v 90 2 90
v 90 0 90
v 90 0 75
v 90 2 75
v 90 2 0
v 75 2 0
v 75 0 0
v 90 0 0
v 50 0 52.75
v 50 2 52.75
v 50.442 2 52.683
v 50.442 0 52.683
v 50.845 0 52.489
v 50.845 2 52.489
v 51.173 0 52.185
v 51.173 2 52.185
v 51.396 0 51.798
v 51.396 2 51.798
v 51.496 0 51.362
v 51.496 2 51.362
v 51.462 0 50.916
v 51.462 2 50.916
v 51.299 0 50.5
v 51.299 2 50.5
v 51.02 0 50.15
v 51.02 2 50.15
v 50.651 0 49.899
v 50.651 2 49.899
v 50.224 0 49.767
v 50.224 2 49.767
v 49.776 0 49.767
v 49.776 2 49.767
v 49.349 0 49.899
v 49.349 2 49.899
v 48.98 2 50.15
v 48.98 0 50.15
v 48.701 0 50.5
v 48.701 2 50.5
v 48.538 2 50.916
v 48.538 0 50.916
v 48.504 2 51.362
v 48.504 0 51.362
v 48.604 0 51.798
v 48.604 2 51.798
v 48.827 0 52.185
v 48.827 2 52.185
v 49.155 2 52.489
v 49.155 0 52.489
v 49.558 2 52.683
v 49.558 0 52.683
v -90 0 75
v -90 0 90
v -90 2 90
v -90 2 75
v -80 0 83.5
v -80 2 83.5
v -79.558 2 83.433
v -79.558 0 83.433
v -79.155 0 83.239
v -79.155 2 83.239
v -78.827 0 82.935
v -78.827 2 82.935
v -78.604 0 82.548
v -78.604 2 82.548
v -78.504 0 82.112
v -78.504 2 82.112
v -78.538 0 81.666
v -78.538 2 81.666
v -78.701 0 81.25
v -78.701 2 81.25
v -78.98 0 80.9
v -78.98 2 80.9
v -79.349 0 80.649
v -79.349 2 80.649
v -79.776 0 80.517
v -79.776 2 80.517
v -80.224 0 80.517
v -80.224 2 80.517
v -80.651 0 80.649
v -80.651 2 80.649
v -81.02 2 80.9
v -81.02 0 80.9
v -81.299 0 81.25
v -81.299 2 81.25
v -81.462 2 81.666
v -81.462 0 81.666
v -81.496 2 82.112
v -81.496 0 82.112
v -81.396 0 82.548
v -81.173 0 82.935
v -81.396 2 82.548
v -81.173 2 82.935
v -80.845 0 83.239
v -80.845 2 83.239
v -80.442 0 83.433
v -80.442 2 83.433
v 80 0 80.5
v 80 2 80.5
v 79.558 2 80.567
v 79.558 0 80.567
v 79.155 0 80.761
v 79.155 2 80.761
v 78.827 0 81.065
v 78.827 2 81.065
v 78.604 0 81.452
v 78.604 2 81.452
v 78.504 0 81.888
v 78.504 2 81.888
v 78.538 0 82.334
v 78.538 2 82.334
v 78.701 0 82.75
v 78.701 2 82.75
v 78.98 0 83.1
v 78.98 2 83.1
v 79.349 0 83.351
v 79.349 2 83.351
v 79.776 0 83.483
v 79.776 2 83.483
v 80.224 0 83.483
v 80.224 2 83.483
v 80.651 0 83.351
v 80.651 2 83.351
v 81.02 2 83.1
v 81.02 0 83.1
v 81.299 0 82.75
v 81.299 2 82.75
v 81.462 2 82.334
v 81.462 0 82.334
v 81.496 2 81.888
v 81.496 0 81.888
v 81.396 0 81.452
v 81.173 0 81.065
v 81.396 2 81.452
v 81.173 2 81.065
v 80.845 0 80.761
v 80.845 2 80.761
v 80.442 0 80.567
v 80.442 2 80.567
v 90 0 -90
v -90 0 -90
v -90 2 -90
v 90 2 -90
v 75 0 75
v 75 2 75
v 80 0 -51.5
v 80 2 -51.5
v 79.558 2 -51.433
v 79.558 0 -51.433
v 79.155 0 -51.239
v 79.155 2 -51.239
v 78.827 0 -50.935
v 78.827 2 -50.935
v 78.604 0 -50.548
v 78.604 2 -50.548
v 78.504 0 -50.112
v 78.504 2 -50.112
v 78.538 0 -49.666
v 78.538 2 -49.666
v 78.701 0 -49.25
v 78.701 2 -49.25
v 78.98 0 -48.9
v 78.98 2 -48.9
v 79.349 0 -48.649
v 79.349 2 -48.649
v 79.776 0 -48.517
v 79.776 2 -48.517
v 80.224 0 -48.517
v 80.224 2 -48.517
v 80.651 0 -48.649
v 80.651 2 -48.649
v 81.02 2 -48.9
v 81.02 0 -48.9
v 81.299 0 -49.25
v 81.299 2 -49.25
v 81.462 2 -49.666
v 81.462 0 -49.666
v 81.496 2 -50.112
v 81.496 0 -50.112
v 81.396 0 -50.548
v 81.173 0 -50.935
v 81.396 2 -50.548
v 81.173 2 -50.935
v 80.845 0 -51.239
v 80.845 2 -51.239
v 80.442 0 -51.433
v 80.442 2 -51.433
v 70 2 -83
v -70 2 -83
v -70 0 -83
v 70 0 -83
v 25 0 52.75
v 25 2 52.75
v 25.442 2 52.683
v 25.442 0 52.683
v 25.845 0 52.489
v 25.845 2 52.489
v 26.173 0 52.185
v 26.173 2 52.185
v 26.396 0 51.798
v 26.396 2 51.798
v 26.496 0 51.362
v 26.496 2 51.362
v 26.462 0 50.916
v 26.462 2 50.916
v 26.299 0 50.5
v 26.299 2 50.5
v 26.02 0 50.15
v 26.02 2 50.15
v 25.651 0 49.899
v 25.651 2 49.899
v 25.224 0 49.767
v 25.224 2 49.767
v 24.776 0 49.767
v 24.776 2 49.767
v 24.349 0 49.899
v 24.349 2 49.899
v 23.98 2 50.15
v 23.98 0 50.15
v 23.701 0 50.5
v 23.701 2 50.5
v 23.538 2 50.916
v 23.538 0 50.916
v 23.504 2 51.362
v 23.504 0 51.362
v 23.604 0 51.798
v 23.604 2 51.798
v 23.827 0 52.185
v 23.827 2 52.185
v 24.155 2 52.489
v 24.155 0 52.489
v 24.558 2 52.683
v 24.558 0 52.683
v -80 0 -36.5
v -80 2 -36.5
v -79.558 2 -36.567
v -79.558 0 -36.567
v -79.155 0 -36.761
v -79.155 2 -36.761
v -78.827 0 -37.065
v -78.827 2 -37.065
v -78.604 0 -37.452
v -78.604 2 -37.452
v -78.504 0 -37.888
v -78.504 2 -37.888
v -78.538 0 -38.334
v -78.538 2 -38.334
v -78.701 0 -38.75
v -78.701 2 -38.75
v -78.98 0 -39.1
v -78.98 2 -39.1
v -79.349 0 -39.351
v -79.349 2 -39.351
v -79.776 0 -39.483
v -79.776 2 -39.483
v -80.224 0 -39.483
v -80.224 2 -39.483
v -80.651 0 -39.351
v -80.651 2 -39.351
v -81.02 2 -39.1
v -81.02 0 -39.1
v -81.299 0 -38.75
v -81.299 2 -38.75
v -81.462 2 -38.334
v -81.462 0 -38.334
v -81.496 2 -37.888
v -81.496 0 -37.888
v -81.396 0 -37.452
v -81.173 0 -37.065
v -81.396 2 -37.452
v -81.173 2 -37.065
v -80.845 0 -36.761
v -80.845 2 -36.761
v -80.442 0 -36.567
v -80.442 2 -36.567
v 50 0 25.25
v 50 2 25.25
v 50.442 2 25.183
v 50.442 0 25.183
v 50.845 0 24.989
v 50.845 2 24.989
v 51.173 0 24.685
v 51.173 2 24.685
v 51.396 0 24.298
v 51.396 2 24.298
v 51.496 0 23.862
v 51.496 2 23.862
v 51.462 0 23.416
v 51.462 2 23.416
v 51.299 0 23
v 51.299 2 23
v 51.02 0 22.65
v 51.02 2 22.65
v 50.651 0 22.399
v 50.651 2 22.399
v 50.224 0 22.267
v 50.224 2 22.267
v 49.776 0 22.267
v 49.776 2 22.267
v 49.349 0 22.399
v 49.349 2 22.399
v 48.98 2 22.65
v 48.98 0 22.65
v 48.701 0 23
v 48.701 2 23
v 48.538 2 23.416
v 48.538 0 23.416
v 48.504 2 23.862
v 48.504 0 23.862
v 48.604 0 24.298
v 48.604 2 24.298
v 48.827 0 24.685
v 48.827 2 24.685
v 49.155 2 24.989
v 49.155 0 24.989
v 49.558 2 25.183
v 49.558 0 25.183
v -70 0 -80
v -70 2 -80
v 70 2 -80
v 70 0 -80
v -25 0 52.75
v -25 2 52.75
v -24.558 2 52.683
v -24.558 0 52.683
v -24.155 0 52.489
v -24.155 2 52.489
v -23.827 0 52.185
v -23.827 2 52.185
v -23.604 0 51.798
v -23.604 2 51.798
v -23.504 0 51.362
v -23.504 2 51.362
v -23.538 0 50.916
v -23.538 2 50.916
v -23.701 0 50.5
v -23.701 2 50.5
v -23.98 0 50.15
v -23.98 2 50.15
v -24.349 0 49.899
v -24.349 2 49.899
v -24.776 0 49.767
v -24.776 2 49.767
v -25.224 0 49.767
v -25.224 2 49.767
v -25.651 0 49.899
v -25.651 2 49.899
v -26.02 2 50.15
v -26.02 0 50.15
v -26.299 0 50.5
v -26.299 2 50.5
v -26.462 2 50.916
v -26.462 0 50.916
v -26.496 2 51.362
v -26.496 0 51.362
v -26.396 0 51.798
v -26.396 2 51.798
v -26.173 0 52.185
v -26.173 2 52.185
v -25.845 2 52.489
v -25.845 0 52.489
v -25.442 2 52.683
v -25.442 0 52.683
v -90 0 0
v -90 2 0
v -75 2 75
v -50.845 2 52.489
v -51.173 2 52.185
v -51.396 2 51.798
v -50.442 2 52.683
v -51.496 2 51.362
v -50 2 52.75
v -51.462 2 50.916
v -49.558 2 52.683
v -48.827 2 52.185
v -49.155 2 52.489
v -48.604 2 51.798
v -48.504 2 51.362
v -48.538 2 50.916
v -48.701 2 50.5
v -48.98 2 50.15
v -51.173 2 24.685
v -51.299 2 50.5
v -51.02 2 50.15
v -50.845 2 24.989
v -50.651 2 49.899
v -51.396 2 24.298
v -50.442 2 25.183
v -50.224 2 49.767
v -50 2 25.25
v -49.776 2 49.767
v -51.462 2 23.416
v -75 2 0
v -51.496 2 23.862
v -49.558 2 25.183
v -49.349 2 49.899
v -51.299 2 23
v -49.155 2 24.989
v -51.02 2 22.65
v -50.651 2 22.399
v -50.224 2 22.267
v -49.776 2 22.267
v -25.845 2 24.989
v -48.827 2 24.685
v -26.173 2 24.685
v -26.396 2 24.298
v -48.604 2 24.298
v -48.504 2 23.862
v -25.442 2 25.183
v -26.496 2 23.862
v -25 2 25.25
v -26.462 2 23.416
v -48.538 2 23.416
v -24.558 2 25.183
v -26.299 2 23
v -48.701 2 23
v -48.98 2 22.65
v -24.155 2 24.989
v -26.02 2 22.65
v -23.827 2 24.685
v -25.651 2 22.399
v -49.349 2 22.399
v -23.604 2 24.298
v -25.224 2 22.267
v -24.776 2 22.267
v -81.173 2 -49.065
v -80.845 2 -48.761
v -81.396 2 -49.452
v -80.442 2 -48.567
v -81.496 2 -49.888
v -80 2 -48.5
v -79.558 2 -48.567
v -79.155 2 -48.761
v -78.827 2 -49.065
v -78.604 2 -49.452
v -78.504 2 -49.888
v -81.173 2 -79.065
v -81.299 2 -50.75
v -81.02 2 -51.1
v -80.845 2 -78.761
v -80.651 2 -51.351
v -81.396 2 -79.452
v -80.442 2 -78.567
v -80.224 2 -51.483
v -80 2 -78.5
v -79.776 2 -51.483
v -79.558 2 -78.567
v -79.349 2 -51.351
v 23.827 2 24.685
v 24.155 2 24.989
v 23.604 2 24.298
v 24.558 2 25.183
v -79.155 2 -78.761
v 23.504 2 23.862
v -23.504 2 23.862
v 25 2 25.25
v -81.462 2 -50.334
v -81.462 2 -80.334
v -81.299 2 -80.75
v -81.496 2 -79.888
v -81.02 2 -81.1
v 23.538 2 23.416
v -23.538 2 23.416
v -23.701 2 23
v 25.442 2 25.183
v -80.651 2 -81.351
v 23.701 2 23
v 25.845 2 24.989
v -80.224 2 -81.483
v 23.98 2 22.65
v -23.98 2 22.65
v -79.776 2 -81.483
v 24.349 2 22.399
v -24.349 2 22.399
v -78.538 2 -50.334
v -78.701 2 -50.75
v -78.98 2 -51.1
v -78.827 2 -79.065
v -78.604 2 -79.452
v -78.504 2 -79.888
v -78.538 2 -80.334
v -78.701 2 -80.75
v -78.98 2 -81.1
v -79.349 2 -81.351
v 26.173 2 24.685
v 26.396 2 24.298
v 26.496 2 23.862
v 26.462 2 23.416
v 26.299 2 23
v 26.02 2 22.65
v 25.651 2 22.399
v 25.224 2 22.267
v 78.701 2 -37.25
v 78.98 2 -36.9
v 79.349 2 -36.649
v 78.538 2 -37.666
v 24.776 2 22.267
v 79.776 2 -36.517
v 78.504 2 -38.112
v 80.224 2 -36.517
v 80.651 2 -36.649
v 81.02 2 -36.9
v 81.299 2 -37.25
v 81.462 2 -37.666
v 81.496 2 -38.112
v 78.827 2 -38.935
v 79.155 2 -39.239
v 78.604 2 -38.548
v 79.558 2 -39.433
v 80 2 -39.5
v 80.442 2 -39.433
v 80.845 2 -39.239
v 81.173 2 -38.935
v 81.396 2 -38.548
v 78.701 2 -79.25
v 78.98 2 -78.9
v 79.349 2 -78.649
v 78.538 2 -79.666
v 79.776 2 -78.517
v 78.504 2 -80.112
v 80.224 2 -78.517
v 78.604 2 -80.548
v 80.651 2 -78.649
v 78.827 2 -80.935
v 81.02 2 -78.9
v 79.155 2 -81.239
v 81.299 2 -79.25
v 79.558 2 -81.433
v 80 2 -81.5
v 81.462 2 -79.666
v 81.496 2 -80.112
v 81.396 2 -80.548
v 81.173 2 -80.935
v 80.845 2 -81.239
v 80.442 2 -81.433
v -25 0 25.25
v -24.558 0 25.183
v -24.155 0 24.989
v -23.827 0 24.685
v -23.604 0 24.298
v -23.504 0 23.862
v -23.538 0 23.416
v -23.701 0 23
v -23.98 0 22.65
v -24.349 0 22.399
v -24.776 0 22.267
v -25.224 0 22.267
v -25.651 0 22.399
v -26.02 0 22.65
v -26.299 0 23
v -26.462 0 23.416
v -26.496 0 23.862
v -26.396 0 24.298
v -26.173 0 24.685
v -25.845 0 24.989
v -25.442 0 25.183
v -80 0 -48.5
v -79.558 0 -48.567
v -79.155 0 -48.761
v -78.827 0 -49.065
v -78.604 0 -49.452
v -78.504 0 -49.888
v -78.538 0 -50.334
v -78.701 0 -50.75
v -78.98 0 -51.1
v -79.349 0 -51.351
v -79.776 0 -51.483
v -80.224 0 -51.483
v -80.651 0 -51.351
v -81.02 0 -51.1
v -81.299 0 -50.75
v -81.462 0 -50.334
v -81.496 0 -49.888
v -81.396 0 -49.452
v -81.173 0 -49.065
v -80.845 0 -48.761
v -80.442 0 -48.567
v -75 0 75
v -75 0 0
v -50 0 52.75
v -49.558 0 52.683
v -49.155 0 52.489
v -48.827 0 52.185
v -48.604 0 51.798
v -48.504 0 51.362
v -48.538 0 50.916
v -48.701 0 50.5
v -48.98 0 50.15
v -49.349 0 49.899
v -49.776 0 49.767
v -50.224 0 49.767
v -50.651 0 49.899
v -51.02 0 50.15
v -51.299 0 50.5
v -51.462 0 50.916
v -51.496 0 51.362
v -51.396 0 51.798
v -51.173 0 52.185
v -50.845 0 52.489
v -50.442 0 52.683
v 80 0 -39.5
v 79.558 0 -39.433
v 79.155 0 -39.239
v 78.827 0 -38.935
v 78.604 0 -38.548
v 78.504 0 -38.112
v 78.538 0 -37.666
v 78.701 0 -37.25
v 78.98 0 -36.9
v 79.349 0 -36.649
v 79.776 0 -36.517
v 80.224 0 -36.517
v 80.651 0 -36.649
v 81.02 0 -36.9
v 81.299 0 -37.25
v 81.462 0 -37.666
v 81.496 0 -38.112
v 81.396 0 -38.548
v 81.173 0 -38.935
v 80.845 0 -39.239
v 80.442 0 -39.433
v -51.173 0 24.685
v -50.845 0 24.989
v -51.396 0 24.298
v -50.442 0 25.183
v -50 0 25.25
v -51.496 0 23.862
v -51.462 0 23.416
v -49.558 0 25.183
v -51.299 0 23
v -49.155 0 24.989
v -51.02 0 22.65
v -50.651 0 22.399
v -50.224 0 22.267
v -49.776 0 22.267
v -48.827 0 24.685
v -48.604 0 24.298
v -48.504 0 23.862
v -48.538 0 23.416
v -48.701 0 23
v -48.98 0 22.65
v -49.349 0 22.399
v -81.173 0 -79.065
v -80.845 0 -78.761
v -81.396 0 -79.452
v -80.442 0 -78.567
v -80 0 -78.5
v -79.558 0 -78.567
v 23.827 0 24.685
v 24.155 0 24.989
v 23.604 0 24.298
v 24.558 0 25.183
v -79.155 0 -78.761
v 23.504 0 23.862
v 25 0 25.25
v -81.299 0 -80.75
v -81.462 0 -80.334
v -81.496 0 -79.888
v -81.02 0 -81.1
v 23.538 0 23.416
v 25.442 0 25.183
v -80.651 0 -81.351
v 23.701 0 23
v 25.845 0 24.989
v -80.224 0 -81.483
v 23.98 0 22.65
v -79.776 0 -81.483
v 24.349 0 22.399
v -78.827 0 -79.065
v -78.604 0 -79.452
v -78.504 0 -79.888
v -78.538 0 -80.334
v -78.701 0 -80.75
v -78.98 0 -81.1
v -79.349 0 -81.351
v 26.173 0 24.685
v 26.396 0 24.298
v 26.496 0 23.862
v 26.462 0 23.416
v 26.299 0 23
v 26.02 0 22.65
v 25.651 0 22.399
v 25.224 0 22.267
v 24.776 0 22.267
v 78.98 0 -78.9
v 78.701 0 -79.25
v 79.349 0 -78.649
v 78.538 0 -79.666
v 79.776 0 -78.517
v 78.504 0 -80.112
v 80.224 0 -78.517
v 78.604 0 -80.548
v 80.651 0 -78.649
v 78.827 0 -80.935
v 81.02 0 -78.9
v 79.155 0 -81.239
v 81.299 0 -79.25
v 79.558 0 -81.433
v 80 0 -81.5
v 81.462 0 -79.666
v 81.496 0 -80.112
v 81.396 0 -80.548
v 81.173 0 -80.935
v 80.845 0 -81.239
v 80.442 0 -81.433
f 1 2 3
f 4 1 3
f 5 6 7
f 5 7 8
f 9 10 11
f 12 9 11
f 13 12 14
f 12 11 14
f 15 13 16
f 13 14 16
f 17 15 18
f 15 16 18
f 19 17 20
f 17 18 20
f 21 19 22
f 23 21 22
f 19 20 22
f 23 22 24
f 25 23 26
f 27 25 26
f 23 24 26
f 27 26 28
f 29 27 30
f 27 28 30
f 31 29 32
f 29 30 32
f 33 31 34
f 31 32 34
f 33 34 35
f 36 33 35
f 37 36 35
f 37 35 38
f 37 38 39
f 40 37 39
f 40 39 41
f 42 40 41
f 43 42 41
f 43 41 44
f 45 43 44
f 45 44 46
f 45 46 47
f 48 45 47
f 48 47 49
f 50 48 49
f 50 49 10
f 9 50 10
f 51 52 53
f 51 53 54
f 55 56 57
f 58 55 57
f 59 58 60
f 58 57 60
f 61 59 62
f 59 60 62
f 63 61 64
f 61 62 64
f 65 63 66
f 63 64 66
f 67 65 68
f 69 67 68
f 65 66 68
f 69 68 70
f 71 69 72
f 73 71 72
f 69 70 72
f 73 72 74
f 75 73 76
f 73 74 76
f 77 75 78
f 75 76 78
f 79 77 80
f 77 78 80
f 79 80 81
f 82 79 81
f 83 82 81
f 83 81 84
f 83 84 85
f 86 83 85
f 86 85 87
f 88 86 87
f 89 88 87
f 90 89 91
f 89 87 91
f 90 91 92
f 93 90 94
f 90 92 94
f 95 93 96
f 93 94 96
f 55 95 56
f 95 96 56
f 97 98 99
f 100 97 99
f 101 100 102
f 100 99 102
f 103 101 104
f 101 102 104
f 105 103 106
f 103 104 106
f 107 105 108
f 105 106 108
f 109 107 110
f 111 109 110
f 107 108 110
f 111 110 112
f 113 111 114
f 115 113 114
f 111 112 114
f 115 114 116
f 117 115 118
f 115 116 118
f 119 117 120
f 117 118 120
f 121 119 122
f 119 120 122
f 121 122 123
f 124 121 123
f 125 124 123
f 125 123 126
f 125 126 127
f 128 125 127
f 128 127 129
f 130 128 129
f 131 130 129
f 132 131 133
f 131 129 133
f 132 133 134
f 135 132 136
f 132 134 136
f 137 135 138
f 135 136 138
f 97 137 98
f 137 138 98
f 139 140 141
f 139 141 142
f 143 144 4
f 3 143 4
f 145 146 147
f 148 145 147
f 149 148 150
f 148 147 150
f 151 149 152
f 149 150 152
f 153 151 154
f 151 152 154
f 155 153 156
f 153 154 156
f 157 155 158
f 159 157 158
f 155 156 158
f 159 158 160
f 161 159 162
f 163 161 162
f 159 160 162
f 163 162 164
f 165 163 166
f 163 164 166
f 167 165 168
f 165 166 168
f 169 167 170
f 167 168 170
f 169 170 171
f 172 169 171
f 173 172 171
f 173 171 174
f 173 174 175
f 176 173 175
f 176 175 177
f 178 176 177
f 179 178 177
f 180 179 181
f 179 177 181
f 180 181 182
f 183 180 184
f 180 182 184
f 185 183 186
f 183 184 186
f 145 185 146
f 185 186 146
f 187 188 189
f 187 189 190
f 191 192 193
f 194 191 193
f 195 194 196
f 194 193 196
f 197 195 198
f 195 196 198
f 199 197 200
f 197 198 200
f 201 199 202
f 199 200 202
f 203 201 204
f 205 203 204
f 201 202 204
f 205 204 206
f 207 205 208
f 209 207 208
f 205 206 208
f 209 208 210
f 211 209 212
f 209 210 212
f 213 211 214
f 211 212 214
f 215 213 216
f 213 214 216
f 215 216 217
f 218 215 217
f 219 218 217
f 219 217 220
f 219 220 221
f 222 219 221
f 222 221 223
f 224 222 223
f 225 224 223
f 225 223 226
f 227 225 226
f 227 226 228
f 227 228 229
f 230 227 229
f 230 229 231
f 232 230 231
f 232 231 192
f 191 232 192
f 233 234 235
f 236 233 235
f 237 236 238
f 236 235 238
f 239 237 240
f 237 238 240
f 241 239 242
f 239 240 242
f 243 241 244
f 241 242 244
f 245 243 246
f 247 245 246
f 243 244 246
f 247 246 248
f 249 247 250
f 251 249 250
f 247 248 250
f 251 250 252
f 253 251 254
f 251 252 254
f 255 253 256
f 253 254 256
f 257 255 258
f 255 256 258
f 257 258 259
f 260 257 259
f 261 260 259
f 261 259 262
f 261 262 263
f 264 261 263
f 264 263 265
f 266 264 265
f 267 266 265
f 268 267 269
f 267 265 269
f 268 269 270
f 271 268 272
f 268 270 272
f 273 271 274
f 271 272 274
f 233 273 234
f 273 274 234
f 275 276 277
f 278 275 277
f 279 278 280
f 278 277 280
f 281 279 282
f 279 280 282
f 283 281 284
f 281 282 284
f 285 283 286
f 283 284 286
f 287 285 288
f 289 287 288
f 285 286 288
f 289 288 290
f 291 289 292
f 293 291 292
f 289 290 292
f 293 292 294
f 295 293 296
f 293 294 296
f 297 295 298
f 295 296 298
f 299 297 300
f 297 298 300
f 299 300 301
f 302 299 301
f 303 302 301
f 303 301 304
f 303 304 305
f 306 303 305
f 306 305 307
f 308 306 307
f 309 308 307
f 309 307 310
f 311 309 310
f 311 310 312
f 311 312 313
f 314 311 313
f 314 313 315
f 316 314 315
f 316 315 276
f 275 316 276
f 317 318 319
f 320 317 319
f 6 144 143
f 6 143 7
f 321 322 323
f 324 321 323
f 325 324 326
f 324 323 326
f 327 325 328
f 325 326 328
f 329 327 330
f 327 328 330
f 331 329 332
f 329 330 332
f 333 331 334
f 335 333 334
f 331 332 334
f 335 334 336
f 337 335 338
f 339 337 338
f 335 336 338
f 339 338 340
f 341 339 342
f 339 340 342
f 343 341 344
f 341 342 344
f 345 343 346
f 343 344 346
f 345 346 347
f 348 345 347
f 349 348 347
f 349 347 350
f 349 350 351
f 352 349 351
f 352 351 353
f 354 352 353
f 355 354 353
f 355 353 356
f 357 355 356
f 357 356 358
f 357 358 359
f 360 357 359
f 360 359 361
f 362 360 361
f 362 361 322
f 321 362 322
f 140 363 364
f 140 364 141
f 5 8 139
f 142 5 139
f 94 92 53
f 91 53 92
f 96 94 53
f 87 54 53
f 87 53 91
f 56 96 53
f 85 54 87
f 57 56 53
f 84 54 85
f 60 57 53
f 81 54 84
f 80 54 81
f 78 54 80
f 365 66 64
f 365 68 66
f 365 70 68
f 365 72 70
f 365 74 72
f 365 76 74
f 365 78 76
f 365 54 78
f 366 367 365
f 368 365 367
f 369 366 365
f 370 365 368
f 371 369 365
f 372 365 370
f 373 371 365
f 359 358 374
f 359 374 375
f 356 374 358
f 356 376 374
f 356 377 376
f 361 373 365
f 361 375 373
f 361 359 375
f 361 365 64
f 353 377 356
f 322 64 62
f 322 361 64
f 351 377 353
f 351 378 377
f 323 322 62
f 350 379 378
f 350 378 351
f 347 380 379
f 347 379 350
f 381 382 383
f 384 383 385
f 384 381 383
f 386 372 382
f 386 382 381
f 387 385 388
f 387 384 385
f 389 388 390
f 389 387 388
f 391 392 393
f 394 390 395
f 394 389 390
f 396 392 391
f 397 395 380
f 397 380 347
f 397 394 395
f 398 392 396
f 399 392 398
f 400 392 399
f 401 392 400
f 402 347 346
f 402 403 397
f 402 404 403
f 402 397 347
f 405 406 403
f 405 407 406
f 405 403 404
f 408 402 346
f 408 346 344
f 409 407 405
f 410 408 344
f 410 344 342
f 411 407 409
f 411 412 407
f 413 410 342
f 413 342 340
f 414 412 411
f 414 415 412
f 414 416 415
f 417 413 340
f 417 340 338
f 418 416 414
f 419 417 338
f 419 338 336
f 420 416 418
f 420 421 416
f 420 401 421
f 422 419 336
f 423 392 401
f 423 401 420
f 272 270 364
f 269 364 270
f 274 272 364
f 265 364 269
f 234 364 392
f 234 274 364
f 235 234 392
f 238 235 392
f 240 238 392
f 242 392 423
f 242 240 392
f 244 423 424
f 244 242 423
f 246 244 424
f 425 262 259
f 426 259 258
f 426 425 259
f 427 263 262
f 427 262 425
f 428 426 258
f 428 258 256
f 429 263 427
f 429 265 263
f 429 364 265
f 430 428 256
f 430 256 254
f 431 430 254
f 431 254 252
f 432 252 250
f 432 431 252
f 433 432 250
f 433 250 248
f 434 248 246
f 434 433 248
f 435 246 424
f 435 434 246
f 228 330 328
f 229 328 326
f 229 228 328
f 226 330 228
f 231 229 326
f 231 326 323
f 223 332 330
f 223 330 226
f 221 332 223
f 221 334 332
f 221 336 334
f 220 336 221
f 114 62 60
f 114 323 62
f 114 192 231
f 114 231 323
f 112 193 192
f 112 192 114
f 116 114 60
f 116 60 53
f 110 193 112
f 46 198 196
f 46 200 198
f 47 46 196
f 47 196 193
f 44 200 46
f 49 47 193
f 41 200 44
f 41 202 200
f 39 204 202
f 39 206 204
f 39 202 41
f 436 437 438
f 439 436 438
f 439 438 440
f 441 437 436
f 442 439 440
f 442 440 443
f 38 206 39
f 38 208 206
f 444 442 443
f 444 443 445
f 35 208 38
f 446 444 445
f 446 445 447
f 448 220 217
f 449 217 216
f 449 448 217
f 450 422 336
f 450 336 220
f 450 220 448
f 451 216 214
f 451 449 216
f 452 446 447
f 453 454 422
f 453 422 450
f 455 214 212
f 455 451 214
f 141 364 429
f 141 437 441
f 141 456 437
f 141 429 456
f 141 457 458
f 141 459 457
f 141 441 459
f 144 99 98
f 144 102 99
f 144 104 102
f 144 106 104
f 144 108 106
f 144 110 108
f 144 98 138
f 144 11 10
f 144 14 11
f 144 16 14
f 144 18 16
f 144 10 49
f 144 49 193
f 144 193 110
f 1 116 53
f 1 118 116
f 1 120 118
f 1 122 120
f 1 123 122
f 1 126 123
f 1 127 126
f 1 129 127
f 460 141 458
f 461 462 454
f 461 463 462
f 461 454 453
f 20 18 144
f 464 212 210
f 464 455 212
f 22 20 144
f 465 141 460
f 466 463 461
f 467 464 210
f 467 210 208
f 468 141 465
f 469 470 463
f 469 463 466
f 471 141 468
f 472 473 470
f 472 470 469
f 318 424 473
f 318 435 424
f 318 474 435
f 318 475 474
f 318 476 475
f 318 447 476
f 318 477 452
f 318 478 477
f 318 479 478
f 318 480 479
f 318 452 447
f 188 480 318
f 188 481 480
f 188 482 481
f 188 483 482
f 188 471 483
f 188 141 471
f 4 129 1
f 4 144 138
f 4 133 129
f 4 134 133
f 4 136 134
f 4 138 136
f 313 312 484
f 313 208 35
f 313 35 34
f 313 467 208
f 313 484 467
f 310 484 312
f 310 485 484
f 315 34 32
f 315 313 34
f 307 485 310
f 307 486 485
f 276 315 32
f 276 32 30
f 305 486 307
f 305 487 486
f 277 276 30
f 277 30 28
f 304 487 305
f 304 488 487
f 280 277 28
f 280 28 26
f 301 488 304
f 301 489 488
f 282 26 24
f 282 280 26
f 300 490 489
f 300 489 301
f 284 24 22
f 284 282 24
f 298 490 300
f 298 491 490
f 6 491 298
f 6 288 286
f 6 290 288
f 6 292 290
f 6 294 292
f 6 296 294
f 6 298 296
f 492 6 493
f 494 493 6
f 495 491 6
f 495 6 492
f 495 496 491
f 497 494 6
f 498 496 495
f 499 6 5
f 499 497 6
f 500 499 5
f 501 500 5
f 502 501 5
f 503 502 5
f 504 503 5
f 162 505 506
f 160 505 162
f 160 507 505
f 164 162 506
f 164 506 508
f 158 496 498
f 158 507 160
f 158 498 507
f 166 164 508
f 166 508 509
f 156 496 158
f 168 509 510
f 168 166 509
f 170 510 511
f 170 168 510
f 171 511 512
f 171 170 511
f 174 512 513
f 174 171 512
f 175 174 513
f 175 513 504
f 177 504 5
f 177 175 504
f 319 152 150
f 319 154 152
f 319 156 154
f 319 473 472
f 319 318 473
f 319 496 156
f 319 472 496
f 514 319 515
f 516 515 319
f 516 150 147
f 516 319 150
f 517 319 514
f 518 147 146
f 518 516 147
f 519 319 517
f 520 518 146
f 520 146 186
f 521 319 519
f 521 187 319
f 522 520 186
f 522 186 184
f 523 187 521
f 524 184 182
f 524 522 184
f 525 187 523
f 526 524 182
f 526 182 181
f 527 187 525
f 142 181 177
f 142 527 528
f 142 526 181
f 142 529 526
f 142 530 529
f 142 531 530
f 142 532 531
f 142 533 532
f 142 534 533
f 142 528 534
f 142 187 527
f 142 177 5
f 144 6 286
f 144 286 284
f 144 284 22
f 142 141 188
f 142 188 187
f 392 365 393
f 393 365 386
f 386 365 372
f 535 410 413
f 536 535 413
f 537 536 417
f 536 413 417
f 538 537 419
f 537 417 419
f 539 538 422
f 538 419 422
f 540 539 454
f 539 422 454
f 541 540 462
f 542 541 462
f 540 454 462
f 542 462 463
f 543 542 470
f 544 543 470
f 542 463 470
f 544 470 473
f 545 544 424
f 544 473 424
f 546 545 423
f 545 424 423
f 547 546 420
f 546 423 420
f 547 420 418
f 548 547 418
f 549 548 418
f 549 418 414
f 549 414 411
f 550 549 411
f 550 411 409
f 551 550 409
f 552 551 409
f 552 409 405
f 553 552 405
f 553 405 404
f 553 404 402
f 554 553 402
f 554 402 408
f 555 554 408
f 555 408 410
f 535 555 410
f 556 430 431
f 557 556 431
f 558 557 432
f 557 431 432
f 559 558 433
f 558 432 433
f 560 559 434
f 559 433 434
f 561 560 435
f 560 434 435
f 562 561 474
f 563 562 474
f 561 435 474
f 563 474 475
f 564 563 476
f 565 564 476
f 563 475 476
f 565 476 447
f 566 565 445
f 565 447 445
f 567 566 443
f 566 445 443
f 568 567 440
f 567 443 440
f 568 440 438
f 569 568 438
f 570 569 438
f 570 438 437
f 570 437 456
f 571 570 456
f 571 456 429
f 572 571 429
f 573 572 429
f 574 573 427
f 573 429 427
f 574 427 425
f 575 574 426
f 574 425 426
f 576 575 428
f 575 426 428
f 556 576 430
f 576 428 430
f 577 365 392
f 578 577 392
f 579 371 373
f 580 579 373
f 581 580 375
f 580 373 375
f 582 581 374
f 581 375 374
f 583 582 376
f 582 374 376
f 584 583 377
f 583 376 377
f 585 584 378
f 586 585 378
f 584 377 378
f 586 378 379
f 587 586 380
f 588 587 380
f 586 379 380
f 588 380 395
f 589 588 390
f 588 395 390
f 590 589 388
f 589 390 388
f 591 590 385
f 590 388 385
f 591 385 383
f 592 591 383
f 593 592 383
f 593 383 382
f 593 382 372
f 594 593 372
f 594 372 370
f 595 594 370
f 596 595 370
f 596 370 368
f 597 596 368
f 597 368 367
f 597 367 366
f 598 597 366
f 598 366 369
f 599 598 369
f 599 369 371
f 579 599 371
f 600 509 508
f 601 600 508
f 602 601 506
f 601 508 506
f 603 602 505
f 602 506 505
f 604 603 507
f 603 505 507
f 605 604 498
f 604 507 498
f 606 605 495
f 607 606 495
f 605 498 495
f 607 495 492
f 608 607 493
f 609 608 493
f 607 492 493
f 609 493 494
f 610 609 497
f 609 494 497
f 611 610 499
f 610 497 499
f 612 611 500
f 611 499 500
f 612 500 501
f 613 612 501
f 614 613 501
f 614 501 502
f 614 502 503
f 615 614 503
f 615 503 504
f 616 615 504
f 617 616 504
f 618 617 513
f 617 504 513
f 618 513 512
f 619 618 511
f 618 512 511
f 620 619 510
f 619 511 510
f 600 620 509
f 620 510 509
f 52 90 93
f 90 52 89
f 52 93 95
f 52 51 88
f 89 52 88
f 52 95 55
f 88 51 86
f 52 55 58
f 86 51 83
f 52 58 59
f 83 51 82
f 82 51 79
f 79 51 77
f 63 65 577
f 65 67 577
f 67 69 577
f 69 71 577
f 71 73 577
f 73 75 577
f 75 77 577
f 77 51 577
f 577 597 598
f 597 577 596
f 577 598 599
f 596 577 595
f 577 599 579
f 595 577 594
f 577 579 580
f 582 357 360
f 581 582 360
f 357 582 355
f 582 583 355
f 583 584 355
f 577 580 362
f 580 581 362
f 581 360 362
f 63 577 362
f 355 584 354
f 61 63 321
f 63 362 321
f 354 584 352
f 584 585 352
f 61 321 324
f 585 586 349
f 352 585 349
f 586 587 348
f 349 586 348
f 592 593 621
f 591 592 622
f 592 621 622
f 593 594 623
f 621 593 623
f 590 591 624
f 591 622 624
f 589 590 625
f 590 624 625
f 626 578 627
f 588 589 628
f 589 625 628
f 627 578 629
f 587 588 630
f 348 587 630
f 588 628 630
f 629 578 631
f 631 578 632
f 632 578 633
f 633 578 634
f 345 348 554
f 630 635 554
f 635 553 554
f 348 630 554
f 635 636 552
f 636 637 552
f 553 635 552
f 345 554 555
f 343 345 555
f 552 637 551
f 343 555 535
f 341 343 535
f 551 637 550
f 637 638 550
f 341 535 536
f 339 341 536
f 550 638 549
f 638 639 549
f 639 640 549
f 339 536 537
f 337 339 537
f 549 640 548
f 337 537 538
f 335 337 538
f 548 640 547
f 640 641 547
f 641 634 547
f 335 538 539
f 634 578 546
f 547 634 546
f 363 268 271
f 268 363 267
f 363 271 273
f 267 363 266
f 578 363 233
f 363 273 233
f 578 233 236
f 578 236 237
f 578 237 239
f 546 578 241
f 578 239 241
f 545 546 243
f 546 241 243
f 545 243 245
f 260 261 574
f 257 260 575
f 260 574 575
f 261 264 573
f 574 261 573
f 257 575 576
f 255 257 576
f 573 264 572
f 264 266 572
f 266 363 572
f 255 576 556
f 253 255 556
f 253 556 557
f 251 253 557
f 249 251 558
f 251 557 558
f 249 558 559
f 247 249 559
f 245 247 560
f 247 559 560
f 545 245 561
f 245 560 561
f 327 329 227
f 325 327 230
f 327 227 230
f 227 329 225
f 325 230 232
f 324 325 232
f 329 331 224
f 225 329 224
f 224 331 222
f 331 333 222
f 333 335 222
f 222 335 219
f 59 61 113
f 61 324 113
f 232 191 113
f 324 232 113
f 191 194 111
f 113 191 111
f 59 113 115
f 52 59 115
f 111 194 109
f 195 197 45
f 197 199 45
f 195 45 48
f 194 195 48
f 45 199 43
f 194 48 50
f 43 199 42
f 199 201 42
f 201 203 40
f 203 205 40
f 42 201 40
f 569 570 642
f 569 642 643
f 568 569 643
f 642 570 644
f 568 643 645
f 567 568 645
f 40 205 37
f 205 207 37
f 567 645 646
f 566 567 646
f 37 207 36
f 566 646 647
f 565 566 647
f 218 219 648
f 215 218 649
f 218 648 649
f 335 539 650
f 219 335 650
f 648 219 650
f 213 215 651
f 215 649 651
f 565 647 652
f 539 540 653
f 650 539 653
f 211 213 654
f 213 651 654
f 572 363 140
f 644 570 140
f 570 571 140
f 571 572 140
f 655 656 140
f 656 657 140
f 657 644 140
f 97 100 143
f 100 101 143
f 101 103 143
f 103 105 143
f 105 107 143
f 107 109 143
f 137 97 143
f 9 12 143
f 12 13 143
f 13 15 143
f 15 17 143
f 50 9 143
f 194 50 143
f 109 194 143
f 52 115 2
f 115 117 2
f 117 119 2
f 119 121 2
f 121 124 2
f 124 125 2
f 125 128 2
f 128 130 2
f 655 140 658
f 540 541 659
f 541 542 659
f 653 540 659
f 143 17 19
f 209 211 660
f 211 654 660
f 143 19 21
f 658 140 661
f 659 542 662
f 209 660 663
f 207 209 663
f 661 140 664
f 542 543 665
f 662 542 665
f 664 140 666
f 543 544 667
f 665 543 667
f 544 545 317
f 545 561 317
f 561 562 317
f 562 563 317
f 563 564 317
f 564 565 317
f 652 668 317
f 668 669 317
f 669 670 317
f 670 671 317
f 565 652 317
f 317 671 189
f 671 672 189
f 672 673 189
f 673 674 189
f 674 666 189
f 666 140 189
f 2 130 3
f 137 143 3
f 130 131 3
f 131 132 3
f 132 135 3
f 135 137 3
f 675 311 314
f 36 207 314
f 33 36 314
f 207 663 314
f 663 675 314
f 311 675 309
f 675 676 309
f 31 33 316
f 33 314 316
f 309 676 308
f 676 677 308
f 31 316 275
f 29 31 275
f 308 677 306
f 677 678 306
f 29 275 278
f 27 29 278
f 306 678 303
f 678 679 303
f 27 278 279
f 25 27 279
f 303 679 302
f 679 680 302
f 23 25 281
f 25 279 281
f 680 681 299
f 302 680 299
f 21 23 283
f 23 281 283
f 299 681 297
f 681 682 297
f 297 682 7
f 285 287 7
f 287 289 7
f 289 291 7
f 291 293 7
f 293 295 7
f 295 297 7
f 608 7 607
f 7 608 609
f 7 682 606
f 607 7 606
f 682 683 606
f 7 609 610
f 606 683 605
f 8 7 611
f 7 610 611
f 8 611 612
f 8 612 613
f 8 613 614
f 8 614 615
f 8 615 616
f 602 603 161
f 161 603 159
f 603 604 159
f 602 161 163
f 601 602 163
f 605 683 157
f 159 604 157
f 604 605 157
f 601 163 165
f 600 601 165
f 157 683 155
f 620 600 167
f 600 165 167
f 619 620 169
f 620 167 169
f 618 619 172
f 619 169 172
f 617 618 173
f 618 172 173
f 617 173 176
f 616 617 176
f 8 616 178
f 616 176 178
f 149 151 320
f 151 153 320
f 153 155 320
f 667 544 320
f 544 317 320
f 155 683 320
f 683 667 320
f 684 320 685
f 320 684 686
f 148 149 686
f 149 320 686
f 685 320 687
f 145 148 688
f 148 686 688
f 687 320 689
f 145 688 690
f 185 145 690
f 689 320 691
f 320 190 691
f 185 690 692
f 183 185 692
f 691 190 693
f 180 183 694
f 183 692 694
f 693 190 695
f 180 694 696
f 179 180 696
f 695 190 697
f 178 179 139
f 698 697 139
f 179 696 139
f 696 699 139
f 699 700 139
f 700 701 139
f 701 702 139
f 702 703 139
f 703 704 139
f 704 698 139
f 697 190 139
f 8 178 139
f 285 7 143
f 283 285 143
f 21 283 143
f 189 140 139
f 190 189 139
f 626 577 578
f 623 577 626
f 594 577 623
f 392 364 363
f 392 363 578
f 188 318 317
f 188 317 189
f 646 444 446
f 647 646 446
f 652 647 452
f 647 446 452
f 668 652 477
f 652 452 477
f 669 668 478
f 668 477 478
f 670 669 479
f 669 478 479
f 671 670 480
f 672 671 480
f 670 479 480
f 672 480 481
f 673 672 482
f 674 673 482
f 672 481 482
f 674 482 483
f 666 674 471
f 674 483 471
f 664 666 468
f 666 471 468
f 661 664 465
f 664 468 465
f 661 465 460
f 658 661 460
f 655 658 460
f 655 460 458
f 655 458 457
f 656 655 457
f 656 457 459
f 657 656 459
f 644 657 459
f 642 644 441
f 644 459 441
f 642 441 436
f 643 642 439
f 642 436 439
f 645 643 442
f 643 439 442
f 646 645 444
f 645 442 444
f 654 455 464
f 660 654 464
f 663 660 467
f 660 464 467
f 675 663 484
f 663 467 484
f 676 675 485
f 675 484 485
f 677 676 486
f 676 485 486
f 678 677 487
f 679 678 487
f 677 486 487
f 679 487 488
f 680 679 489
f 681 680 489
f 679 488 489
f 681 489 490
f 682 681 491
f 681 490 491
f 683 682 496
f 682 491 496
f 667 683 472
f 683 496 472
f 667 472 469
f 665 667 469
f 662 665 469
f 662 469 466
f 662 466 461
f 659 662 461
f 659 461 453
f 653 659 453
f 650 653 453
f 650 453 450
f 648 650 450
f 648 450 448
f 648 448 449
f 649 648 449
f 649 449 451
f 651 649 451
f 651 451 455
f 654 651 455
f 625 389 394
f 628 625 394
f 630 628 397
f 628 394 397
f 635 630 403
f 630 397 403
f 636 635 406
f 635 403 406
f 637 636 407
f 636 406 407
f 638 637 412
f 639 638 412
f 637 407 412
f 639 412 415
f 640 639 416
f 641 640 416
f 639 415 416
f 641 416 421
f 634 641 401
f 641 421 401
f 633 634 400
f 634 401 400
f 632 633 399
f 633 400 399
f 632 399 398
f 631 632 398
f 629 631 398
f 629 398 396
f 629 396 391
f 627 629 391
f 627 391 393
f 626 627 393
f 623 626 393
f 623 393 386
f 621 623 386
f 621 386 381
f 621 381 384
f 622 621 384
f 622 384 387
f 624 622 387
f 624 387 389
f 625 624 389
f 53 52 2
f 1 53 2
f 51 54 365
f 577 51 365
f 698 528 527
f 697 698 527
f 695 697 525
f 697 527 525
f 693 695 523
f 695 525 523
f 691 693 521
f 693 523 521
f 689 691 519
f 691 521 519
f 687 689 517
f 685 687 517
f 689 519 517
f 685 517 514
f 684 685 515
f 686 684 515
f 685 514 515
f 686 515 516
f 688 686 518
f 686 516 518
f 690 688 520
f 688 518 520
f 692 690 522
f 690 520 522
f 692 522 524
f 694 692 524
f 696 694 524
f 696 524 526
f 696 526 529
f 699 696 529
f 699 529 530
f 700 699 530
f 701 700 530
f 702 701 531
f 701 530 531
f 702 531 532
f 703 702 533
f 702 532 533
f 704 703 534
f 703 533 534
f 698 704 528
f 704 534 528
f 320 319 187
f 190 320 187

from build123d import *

# Parameters (mm, degrees)
SKETCH1_W           = 180
SKETCH1_H           = 180
BOSS_EXTRUDE1_DEPTH = 2
SKETCH2_R           = 1.5
SKETCH2_W           = 15
SKETCH2_H           = 75
SKETCH2_W_2         = 140
SKETCH2_H_2         = 3
CUT_EXTRUDE1_DEPTH  = 2
SKETCH3_R           = 1.5
CUT_EXTRUDE2_DEPTH  = 3


with BuildPart() as part:
    # Sketch1 → Boss-Extrude1 (new body)
    with BuildSketch(Plane(origin=(0, 0, 0), x_dir=(1, 0, 0), z_dir=(0, 1, 0))):
        Rectangle(SKETCH1_W, SKETCH1_H)
    extrude(amount=BOSS_EXTRUDE1_DEPTH)

    # Sketch2 → Cut-Extrude1 (cut)
    with BuildSketch(Plane(origin=(0, 2, 0), x_dir=(1, 0, 0), z_dir=(0, 1, 0))):
        with Locations(Location((-80, 38, 0), (0, 0, 270))):
            Circle(SKETCH2_R)
        with Locations(Location((-80, -82, 0), (0, 0, 270))):
            Circle(SKETCH2_R)
        with Locations(Location((80, -82, 0), (0, 0, 90))):
            Circle(SKETCH2_R)
        with Locations(Location((80, 38, 0), (0, 0, 90))):
            Circle(SKETCH2_R)
        with Locations(Location((-80, 80, 0), (0, 0, 270))):
            Circle(SKETCH2_R)
        with Locations(Location((-80, 50, 0), (0, 0, 270))):
            Circle(SKETCH2_R)
        with Locations(Location((80, 50, 0), (0, 0, 90))):
            Circle(SKETCH2_R)
        with Locations(Location((80, 80, 0), (0, 0, 90))):
            Circle(SKETCH2_R)
        with Locations((-82.5, -37.5)):
            Rectangle(SKETCH2_W, SKETCH2_H)
        with Locations((82.5, -37.5)):
            Rectangle(SKETCH2_W, SKETCH2_H)
        with Locations((0, 81.5)):
            Rectangle(SKETCH2_W_2, SKETCH2_H_2)
    extrude(amount=-CUT_EXTRUDE1_DEPTH, mode=Mode.SUBTRACT)

    # Sketch3 → Cut-Extrude2 (cut)
    with BuildSketch(Plane(origin=(0, 2, 0), x_dir=(1, 0, 0), z_dir=(0, 1, 0))):
        with Locations(Location((-50, -23.75, 0), (0, 0, 270))):
            Circle(SKETCH3_R)
        with Locations(Location((-50, -51.25, 0), (0, 0, 270))):
            Circle(SKETCH3_R)
        with Locations(Location((-25, -23.75, 0), (0, 0, 270))):
            Circle(SKETCH3_R)
        with Locations(Location((-25, -51.25, 0), (0, 0, 270))):
            Circle(SKETCH3_R)
        with Locations(Location((25, -23.75, 0), (0, 0, 270))):
            Circle(SKETCH3_R)
        with Locations(Location((50, -23.75, 0), (0, 0, 270))):
            Circle(SKETCH3_R)
        with Locations(Location((25, -51.25, 0), (0, 0, 270))):
            Circle(SKETCH3_R)
        with Locations(Location((50, -51.25, 0), (0, 0, 270))):
            Circle(SKETCH3_R)
    extrude(amount=-CUT_EXTRUDE2_DEPTH, mode=Mode.SUBTRACT)


solid = part.part
